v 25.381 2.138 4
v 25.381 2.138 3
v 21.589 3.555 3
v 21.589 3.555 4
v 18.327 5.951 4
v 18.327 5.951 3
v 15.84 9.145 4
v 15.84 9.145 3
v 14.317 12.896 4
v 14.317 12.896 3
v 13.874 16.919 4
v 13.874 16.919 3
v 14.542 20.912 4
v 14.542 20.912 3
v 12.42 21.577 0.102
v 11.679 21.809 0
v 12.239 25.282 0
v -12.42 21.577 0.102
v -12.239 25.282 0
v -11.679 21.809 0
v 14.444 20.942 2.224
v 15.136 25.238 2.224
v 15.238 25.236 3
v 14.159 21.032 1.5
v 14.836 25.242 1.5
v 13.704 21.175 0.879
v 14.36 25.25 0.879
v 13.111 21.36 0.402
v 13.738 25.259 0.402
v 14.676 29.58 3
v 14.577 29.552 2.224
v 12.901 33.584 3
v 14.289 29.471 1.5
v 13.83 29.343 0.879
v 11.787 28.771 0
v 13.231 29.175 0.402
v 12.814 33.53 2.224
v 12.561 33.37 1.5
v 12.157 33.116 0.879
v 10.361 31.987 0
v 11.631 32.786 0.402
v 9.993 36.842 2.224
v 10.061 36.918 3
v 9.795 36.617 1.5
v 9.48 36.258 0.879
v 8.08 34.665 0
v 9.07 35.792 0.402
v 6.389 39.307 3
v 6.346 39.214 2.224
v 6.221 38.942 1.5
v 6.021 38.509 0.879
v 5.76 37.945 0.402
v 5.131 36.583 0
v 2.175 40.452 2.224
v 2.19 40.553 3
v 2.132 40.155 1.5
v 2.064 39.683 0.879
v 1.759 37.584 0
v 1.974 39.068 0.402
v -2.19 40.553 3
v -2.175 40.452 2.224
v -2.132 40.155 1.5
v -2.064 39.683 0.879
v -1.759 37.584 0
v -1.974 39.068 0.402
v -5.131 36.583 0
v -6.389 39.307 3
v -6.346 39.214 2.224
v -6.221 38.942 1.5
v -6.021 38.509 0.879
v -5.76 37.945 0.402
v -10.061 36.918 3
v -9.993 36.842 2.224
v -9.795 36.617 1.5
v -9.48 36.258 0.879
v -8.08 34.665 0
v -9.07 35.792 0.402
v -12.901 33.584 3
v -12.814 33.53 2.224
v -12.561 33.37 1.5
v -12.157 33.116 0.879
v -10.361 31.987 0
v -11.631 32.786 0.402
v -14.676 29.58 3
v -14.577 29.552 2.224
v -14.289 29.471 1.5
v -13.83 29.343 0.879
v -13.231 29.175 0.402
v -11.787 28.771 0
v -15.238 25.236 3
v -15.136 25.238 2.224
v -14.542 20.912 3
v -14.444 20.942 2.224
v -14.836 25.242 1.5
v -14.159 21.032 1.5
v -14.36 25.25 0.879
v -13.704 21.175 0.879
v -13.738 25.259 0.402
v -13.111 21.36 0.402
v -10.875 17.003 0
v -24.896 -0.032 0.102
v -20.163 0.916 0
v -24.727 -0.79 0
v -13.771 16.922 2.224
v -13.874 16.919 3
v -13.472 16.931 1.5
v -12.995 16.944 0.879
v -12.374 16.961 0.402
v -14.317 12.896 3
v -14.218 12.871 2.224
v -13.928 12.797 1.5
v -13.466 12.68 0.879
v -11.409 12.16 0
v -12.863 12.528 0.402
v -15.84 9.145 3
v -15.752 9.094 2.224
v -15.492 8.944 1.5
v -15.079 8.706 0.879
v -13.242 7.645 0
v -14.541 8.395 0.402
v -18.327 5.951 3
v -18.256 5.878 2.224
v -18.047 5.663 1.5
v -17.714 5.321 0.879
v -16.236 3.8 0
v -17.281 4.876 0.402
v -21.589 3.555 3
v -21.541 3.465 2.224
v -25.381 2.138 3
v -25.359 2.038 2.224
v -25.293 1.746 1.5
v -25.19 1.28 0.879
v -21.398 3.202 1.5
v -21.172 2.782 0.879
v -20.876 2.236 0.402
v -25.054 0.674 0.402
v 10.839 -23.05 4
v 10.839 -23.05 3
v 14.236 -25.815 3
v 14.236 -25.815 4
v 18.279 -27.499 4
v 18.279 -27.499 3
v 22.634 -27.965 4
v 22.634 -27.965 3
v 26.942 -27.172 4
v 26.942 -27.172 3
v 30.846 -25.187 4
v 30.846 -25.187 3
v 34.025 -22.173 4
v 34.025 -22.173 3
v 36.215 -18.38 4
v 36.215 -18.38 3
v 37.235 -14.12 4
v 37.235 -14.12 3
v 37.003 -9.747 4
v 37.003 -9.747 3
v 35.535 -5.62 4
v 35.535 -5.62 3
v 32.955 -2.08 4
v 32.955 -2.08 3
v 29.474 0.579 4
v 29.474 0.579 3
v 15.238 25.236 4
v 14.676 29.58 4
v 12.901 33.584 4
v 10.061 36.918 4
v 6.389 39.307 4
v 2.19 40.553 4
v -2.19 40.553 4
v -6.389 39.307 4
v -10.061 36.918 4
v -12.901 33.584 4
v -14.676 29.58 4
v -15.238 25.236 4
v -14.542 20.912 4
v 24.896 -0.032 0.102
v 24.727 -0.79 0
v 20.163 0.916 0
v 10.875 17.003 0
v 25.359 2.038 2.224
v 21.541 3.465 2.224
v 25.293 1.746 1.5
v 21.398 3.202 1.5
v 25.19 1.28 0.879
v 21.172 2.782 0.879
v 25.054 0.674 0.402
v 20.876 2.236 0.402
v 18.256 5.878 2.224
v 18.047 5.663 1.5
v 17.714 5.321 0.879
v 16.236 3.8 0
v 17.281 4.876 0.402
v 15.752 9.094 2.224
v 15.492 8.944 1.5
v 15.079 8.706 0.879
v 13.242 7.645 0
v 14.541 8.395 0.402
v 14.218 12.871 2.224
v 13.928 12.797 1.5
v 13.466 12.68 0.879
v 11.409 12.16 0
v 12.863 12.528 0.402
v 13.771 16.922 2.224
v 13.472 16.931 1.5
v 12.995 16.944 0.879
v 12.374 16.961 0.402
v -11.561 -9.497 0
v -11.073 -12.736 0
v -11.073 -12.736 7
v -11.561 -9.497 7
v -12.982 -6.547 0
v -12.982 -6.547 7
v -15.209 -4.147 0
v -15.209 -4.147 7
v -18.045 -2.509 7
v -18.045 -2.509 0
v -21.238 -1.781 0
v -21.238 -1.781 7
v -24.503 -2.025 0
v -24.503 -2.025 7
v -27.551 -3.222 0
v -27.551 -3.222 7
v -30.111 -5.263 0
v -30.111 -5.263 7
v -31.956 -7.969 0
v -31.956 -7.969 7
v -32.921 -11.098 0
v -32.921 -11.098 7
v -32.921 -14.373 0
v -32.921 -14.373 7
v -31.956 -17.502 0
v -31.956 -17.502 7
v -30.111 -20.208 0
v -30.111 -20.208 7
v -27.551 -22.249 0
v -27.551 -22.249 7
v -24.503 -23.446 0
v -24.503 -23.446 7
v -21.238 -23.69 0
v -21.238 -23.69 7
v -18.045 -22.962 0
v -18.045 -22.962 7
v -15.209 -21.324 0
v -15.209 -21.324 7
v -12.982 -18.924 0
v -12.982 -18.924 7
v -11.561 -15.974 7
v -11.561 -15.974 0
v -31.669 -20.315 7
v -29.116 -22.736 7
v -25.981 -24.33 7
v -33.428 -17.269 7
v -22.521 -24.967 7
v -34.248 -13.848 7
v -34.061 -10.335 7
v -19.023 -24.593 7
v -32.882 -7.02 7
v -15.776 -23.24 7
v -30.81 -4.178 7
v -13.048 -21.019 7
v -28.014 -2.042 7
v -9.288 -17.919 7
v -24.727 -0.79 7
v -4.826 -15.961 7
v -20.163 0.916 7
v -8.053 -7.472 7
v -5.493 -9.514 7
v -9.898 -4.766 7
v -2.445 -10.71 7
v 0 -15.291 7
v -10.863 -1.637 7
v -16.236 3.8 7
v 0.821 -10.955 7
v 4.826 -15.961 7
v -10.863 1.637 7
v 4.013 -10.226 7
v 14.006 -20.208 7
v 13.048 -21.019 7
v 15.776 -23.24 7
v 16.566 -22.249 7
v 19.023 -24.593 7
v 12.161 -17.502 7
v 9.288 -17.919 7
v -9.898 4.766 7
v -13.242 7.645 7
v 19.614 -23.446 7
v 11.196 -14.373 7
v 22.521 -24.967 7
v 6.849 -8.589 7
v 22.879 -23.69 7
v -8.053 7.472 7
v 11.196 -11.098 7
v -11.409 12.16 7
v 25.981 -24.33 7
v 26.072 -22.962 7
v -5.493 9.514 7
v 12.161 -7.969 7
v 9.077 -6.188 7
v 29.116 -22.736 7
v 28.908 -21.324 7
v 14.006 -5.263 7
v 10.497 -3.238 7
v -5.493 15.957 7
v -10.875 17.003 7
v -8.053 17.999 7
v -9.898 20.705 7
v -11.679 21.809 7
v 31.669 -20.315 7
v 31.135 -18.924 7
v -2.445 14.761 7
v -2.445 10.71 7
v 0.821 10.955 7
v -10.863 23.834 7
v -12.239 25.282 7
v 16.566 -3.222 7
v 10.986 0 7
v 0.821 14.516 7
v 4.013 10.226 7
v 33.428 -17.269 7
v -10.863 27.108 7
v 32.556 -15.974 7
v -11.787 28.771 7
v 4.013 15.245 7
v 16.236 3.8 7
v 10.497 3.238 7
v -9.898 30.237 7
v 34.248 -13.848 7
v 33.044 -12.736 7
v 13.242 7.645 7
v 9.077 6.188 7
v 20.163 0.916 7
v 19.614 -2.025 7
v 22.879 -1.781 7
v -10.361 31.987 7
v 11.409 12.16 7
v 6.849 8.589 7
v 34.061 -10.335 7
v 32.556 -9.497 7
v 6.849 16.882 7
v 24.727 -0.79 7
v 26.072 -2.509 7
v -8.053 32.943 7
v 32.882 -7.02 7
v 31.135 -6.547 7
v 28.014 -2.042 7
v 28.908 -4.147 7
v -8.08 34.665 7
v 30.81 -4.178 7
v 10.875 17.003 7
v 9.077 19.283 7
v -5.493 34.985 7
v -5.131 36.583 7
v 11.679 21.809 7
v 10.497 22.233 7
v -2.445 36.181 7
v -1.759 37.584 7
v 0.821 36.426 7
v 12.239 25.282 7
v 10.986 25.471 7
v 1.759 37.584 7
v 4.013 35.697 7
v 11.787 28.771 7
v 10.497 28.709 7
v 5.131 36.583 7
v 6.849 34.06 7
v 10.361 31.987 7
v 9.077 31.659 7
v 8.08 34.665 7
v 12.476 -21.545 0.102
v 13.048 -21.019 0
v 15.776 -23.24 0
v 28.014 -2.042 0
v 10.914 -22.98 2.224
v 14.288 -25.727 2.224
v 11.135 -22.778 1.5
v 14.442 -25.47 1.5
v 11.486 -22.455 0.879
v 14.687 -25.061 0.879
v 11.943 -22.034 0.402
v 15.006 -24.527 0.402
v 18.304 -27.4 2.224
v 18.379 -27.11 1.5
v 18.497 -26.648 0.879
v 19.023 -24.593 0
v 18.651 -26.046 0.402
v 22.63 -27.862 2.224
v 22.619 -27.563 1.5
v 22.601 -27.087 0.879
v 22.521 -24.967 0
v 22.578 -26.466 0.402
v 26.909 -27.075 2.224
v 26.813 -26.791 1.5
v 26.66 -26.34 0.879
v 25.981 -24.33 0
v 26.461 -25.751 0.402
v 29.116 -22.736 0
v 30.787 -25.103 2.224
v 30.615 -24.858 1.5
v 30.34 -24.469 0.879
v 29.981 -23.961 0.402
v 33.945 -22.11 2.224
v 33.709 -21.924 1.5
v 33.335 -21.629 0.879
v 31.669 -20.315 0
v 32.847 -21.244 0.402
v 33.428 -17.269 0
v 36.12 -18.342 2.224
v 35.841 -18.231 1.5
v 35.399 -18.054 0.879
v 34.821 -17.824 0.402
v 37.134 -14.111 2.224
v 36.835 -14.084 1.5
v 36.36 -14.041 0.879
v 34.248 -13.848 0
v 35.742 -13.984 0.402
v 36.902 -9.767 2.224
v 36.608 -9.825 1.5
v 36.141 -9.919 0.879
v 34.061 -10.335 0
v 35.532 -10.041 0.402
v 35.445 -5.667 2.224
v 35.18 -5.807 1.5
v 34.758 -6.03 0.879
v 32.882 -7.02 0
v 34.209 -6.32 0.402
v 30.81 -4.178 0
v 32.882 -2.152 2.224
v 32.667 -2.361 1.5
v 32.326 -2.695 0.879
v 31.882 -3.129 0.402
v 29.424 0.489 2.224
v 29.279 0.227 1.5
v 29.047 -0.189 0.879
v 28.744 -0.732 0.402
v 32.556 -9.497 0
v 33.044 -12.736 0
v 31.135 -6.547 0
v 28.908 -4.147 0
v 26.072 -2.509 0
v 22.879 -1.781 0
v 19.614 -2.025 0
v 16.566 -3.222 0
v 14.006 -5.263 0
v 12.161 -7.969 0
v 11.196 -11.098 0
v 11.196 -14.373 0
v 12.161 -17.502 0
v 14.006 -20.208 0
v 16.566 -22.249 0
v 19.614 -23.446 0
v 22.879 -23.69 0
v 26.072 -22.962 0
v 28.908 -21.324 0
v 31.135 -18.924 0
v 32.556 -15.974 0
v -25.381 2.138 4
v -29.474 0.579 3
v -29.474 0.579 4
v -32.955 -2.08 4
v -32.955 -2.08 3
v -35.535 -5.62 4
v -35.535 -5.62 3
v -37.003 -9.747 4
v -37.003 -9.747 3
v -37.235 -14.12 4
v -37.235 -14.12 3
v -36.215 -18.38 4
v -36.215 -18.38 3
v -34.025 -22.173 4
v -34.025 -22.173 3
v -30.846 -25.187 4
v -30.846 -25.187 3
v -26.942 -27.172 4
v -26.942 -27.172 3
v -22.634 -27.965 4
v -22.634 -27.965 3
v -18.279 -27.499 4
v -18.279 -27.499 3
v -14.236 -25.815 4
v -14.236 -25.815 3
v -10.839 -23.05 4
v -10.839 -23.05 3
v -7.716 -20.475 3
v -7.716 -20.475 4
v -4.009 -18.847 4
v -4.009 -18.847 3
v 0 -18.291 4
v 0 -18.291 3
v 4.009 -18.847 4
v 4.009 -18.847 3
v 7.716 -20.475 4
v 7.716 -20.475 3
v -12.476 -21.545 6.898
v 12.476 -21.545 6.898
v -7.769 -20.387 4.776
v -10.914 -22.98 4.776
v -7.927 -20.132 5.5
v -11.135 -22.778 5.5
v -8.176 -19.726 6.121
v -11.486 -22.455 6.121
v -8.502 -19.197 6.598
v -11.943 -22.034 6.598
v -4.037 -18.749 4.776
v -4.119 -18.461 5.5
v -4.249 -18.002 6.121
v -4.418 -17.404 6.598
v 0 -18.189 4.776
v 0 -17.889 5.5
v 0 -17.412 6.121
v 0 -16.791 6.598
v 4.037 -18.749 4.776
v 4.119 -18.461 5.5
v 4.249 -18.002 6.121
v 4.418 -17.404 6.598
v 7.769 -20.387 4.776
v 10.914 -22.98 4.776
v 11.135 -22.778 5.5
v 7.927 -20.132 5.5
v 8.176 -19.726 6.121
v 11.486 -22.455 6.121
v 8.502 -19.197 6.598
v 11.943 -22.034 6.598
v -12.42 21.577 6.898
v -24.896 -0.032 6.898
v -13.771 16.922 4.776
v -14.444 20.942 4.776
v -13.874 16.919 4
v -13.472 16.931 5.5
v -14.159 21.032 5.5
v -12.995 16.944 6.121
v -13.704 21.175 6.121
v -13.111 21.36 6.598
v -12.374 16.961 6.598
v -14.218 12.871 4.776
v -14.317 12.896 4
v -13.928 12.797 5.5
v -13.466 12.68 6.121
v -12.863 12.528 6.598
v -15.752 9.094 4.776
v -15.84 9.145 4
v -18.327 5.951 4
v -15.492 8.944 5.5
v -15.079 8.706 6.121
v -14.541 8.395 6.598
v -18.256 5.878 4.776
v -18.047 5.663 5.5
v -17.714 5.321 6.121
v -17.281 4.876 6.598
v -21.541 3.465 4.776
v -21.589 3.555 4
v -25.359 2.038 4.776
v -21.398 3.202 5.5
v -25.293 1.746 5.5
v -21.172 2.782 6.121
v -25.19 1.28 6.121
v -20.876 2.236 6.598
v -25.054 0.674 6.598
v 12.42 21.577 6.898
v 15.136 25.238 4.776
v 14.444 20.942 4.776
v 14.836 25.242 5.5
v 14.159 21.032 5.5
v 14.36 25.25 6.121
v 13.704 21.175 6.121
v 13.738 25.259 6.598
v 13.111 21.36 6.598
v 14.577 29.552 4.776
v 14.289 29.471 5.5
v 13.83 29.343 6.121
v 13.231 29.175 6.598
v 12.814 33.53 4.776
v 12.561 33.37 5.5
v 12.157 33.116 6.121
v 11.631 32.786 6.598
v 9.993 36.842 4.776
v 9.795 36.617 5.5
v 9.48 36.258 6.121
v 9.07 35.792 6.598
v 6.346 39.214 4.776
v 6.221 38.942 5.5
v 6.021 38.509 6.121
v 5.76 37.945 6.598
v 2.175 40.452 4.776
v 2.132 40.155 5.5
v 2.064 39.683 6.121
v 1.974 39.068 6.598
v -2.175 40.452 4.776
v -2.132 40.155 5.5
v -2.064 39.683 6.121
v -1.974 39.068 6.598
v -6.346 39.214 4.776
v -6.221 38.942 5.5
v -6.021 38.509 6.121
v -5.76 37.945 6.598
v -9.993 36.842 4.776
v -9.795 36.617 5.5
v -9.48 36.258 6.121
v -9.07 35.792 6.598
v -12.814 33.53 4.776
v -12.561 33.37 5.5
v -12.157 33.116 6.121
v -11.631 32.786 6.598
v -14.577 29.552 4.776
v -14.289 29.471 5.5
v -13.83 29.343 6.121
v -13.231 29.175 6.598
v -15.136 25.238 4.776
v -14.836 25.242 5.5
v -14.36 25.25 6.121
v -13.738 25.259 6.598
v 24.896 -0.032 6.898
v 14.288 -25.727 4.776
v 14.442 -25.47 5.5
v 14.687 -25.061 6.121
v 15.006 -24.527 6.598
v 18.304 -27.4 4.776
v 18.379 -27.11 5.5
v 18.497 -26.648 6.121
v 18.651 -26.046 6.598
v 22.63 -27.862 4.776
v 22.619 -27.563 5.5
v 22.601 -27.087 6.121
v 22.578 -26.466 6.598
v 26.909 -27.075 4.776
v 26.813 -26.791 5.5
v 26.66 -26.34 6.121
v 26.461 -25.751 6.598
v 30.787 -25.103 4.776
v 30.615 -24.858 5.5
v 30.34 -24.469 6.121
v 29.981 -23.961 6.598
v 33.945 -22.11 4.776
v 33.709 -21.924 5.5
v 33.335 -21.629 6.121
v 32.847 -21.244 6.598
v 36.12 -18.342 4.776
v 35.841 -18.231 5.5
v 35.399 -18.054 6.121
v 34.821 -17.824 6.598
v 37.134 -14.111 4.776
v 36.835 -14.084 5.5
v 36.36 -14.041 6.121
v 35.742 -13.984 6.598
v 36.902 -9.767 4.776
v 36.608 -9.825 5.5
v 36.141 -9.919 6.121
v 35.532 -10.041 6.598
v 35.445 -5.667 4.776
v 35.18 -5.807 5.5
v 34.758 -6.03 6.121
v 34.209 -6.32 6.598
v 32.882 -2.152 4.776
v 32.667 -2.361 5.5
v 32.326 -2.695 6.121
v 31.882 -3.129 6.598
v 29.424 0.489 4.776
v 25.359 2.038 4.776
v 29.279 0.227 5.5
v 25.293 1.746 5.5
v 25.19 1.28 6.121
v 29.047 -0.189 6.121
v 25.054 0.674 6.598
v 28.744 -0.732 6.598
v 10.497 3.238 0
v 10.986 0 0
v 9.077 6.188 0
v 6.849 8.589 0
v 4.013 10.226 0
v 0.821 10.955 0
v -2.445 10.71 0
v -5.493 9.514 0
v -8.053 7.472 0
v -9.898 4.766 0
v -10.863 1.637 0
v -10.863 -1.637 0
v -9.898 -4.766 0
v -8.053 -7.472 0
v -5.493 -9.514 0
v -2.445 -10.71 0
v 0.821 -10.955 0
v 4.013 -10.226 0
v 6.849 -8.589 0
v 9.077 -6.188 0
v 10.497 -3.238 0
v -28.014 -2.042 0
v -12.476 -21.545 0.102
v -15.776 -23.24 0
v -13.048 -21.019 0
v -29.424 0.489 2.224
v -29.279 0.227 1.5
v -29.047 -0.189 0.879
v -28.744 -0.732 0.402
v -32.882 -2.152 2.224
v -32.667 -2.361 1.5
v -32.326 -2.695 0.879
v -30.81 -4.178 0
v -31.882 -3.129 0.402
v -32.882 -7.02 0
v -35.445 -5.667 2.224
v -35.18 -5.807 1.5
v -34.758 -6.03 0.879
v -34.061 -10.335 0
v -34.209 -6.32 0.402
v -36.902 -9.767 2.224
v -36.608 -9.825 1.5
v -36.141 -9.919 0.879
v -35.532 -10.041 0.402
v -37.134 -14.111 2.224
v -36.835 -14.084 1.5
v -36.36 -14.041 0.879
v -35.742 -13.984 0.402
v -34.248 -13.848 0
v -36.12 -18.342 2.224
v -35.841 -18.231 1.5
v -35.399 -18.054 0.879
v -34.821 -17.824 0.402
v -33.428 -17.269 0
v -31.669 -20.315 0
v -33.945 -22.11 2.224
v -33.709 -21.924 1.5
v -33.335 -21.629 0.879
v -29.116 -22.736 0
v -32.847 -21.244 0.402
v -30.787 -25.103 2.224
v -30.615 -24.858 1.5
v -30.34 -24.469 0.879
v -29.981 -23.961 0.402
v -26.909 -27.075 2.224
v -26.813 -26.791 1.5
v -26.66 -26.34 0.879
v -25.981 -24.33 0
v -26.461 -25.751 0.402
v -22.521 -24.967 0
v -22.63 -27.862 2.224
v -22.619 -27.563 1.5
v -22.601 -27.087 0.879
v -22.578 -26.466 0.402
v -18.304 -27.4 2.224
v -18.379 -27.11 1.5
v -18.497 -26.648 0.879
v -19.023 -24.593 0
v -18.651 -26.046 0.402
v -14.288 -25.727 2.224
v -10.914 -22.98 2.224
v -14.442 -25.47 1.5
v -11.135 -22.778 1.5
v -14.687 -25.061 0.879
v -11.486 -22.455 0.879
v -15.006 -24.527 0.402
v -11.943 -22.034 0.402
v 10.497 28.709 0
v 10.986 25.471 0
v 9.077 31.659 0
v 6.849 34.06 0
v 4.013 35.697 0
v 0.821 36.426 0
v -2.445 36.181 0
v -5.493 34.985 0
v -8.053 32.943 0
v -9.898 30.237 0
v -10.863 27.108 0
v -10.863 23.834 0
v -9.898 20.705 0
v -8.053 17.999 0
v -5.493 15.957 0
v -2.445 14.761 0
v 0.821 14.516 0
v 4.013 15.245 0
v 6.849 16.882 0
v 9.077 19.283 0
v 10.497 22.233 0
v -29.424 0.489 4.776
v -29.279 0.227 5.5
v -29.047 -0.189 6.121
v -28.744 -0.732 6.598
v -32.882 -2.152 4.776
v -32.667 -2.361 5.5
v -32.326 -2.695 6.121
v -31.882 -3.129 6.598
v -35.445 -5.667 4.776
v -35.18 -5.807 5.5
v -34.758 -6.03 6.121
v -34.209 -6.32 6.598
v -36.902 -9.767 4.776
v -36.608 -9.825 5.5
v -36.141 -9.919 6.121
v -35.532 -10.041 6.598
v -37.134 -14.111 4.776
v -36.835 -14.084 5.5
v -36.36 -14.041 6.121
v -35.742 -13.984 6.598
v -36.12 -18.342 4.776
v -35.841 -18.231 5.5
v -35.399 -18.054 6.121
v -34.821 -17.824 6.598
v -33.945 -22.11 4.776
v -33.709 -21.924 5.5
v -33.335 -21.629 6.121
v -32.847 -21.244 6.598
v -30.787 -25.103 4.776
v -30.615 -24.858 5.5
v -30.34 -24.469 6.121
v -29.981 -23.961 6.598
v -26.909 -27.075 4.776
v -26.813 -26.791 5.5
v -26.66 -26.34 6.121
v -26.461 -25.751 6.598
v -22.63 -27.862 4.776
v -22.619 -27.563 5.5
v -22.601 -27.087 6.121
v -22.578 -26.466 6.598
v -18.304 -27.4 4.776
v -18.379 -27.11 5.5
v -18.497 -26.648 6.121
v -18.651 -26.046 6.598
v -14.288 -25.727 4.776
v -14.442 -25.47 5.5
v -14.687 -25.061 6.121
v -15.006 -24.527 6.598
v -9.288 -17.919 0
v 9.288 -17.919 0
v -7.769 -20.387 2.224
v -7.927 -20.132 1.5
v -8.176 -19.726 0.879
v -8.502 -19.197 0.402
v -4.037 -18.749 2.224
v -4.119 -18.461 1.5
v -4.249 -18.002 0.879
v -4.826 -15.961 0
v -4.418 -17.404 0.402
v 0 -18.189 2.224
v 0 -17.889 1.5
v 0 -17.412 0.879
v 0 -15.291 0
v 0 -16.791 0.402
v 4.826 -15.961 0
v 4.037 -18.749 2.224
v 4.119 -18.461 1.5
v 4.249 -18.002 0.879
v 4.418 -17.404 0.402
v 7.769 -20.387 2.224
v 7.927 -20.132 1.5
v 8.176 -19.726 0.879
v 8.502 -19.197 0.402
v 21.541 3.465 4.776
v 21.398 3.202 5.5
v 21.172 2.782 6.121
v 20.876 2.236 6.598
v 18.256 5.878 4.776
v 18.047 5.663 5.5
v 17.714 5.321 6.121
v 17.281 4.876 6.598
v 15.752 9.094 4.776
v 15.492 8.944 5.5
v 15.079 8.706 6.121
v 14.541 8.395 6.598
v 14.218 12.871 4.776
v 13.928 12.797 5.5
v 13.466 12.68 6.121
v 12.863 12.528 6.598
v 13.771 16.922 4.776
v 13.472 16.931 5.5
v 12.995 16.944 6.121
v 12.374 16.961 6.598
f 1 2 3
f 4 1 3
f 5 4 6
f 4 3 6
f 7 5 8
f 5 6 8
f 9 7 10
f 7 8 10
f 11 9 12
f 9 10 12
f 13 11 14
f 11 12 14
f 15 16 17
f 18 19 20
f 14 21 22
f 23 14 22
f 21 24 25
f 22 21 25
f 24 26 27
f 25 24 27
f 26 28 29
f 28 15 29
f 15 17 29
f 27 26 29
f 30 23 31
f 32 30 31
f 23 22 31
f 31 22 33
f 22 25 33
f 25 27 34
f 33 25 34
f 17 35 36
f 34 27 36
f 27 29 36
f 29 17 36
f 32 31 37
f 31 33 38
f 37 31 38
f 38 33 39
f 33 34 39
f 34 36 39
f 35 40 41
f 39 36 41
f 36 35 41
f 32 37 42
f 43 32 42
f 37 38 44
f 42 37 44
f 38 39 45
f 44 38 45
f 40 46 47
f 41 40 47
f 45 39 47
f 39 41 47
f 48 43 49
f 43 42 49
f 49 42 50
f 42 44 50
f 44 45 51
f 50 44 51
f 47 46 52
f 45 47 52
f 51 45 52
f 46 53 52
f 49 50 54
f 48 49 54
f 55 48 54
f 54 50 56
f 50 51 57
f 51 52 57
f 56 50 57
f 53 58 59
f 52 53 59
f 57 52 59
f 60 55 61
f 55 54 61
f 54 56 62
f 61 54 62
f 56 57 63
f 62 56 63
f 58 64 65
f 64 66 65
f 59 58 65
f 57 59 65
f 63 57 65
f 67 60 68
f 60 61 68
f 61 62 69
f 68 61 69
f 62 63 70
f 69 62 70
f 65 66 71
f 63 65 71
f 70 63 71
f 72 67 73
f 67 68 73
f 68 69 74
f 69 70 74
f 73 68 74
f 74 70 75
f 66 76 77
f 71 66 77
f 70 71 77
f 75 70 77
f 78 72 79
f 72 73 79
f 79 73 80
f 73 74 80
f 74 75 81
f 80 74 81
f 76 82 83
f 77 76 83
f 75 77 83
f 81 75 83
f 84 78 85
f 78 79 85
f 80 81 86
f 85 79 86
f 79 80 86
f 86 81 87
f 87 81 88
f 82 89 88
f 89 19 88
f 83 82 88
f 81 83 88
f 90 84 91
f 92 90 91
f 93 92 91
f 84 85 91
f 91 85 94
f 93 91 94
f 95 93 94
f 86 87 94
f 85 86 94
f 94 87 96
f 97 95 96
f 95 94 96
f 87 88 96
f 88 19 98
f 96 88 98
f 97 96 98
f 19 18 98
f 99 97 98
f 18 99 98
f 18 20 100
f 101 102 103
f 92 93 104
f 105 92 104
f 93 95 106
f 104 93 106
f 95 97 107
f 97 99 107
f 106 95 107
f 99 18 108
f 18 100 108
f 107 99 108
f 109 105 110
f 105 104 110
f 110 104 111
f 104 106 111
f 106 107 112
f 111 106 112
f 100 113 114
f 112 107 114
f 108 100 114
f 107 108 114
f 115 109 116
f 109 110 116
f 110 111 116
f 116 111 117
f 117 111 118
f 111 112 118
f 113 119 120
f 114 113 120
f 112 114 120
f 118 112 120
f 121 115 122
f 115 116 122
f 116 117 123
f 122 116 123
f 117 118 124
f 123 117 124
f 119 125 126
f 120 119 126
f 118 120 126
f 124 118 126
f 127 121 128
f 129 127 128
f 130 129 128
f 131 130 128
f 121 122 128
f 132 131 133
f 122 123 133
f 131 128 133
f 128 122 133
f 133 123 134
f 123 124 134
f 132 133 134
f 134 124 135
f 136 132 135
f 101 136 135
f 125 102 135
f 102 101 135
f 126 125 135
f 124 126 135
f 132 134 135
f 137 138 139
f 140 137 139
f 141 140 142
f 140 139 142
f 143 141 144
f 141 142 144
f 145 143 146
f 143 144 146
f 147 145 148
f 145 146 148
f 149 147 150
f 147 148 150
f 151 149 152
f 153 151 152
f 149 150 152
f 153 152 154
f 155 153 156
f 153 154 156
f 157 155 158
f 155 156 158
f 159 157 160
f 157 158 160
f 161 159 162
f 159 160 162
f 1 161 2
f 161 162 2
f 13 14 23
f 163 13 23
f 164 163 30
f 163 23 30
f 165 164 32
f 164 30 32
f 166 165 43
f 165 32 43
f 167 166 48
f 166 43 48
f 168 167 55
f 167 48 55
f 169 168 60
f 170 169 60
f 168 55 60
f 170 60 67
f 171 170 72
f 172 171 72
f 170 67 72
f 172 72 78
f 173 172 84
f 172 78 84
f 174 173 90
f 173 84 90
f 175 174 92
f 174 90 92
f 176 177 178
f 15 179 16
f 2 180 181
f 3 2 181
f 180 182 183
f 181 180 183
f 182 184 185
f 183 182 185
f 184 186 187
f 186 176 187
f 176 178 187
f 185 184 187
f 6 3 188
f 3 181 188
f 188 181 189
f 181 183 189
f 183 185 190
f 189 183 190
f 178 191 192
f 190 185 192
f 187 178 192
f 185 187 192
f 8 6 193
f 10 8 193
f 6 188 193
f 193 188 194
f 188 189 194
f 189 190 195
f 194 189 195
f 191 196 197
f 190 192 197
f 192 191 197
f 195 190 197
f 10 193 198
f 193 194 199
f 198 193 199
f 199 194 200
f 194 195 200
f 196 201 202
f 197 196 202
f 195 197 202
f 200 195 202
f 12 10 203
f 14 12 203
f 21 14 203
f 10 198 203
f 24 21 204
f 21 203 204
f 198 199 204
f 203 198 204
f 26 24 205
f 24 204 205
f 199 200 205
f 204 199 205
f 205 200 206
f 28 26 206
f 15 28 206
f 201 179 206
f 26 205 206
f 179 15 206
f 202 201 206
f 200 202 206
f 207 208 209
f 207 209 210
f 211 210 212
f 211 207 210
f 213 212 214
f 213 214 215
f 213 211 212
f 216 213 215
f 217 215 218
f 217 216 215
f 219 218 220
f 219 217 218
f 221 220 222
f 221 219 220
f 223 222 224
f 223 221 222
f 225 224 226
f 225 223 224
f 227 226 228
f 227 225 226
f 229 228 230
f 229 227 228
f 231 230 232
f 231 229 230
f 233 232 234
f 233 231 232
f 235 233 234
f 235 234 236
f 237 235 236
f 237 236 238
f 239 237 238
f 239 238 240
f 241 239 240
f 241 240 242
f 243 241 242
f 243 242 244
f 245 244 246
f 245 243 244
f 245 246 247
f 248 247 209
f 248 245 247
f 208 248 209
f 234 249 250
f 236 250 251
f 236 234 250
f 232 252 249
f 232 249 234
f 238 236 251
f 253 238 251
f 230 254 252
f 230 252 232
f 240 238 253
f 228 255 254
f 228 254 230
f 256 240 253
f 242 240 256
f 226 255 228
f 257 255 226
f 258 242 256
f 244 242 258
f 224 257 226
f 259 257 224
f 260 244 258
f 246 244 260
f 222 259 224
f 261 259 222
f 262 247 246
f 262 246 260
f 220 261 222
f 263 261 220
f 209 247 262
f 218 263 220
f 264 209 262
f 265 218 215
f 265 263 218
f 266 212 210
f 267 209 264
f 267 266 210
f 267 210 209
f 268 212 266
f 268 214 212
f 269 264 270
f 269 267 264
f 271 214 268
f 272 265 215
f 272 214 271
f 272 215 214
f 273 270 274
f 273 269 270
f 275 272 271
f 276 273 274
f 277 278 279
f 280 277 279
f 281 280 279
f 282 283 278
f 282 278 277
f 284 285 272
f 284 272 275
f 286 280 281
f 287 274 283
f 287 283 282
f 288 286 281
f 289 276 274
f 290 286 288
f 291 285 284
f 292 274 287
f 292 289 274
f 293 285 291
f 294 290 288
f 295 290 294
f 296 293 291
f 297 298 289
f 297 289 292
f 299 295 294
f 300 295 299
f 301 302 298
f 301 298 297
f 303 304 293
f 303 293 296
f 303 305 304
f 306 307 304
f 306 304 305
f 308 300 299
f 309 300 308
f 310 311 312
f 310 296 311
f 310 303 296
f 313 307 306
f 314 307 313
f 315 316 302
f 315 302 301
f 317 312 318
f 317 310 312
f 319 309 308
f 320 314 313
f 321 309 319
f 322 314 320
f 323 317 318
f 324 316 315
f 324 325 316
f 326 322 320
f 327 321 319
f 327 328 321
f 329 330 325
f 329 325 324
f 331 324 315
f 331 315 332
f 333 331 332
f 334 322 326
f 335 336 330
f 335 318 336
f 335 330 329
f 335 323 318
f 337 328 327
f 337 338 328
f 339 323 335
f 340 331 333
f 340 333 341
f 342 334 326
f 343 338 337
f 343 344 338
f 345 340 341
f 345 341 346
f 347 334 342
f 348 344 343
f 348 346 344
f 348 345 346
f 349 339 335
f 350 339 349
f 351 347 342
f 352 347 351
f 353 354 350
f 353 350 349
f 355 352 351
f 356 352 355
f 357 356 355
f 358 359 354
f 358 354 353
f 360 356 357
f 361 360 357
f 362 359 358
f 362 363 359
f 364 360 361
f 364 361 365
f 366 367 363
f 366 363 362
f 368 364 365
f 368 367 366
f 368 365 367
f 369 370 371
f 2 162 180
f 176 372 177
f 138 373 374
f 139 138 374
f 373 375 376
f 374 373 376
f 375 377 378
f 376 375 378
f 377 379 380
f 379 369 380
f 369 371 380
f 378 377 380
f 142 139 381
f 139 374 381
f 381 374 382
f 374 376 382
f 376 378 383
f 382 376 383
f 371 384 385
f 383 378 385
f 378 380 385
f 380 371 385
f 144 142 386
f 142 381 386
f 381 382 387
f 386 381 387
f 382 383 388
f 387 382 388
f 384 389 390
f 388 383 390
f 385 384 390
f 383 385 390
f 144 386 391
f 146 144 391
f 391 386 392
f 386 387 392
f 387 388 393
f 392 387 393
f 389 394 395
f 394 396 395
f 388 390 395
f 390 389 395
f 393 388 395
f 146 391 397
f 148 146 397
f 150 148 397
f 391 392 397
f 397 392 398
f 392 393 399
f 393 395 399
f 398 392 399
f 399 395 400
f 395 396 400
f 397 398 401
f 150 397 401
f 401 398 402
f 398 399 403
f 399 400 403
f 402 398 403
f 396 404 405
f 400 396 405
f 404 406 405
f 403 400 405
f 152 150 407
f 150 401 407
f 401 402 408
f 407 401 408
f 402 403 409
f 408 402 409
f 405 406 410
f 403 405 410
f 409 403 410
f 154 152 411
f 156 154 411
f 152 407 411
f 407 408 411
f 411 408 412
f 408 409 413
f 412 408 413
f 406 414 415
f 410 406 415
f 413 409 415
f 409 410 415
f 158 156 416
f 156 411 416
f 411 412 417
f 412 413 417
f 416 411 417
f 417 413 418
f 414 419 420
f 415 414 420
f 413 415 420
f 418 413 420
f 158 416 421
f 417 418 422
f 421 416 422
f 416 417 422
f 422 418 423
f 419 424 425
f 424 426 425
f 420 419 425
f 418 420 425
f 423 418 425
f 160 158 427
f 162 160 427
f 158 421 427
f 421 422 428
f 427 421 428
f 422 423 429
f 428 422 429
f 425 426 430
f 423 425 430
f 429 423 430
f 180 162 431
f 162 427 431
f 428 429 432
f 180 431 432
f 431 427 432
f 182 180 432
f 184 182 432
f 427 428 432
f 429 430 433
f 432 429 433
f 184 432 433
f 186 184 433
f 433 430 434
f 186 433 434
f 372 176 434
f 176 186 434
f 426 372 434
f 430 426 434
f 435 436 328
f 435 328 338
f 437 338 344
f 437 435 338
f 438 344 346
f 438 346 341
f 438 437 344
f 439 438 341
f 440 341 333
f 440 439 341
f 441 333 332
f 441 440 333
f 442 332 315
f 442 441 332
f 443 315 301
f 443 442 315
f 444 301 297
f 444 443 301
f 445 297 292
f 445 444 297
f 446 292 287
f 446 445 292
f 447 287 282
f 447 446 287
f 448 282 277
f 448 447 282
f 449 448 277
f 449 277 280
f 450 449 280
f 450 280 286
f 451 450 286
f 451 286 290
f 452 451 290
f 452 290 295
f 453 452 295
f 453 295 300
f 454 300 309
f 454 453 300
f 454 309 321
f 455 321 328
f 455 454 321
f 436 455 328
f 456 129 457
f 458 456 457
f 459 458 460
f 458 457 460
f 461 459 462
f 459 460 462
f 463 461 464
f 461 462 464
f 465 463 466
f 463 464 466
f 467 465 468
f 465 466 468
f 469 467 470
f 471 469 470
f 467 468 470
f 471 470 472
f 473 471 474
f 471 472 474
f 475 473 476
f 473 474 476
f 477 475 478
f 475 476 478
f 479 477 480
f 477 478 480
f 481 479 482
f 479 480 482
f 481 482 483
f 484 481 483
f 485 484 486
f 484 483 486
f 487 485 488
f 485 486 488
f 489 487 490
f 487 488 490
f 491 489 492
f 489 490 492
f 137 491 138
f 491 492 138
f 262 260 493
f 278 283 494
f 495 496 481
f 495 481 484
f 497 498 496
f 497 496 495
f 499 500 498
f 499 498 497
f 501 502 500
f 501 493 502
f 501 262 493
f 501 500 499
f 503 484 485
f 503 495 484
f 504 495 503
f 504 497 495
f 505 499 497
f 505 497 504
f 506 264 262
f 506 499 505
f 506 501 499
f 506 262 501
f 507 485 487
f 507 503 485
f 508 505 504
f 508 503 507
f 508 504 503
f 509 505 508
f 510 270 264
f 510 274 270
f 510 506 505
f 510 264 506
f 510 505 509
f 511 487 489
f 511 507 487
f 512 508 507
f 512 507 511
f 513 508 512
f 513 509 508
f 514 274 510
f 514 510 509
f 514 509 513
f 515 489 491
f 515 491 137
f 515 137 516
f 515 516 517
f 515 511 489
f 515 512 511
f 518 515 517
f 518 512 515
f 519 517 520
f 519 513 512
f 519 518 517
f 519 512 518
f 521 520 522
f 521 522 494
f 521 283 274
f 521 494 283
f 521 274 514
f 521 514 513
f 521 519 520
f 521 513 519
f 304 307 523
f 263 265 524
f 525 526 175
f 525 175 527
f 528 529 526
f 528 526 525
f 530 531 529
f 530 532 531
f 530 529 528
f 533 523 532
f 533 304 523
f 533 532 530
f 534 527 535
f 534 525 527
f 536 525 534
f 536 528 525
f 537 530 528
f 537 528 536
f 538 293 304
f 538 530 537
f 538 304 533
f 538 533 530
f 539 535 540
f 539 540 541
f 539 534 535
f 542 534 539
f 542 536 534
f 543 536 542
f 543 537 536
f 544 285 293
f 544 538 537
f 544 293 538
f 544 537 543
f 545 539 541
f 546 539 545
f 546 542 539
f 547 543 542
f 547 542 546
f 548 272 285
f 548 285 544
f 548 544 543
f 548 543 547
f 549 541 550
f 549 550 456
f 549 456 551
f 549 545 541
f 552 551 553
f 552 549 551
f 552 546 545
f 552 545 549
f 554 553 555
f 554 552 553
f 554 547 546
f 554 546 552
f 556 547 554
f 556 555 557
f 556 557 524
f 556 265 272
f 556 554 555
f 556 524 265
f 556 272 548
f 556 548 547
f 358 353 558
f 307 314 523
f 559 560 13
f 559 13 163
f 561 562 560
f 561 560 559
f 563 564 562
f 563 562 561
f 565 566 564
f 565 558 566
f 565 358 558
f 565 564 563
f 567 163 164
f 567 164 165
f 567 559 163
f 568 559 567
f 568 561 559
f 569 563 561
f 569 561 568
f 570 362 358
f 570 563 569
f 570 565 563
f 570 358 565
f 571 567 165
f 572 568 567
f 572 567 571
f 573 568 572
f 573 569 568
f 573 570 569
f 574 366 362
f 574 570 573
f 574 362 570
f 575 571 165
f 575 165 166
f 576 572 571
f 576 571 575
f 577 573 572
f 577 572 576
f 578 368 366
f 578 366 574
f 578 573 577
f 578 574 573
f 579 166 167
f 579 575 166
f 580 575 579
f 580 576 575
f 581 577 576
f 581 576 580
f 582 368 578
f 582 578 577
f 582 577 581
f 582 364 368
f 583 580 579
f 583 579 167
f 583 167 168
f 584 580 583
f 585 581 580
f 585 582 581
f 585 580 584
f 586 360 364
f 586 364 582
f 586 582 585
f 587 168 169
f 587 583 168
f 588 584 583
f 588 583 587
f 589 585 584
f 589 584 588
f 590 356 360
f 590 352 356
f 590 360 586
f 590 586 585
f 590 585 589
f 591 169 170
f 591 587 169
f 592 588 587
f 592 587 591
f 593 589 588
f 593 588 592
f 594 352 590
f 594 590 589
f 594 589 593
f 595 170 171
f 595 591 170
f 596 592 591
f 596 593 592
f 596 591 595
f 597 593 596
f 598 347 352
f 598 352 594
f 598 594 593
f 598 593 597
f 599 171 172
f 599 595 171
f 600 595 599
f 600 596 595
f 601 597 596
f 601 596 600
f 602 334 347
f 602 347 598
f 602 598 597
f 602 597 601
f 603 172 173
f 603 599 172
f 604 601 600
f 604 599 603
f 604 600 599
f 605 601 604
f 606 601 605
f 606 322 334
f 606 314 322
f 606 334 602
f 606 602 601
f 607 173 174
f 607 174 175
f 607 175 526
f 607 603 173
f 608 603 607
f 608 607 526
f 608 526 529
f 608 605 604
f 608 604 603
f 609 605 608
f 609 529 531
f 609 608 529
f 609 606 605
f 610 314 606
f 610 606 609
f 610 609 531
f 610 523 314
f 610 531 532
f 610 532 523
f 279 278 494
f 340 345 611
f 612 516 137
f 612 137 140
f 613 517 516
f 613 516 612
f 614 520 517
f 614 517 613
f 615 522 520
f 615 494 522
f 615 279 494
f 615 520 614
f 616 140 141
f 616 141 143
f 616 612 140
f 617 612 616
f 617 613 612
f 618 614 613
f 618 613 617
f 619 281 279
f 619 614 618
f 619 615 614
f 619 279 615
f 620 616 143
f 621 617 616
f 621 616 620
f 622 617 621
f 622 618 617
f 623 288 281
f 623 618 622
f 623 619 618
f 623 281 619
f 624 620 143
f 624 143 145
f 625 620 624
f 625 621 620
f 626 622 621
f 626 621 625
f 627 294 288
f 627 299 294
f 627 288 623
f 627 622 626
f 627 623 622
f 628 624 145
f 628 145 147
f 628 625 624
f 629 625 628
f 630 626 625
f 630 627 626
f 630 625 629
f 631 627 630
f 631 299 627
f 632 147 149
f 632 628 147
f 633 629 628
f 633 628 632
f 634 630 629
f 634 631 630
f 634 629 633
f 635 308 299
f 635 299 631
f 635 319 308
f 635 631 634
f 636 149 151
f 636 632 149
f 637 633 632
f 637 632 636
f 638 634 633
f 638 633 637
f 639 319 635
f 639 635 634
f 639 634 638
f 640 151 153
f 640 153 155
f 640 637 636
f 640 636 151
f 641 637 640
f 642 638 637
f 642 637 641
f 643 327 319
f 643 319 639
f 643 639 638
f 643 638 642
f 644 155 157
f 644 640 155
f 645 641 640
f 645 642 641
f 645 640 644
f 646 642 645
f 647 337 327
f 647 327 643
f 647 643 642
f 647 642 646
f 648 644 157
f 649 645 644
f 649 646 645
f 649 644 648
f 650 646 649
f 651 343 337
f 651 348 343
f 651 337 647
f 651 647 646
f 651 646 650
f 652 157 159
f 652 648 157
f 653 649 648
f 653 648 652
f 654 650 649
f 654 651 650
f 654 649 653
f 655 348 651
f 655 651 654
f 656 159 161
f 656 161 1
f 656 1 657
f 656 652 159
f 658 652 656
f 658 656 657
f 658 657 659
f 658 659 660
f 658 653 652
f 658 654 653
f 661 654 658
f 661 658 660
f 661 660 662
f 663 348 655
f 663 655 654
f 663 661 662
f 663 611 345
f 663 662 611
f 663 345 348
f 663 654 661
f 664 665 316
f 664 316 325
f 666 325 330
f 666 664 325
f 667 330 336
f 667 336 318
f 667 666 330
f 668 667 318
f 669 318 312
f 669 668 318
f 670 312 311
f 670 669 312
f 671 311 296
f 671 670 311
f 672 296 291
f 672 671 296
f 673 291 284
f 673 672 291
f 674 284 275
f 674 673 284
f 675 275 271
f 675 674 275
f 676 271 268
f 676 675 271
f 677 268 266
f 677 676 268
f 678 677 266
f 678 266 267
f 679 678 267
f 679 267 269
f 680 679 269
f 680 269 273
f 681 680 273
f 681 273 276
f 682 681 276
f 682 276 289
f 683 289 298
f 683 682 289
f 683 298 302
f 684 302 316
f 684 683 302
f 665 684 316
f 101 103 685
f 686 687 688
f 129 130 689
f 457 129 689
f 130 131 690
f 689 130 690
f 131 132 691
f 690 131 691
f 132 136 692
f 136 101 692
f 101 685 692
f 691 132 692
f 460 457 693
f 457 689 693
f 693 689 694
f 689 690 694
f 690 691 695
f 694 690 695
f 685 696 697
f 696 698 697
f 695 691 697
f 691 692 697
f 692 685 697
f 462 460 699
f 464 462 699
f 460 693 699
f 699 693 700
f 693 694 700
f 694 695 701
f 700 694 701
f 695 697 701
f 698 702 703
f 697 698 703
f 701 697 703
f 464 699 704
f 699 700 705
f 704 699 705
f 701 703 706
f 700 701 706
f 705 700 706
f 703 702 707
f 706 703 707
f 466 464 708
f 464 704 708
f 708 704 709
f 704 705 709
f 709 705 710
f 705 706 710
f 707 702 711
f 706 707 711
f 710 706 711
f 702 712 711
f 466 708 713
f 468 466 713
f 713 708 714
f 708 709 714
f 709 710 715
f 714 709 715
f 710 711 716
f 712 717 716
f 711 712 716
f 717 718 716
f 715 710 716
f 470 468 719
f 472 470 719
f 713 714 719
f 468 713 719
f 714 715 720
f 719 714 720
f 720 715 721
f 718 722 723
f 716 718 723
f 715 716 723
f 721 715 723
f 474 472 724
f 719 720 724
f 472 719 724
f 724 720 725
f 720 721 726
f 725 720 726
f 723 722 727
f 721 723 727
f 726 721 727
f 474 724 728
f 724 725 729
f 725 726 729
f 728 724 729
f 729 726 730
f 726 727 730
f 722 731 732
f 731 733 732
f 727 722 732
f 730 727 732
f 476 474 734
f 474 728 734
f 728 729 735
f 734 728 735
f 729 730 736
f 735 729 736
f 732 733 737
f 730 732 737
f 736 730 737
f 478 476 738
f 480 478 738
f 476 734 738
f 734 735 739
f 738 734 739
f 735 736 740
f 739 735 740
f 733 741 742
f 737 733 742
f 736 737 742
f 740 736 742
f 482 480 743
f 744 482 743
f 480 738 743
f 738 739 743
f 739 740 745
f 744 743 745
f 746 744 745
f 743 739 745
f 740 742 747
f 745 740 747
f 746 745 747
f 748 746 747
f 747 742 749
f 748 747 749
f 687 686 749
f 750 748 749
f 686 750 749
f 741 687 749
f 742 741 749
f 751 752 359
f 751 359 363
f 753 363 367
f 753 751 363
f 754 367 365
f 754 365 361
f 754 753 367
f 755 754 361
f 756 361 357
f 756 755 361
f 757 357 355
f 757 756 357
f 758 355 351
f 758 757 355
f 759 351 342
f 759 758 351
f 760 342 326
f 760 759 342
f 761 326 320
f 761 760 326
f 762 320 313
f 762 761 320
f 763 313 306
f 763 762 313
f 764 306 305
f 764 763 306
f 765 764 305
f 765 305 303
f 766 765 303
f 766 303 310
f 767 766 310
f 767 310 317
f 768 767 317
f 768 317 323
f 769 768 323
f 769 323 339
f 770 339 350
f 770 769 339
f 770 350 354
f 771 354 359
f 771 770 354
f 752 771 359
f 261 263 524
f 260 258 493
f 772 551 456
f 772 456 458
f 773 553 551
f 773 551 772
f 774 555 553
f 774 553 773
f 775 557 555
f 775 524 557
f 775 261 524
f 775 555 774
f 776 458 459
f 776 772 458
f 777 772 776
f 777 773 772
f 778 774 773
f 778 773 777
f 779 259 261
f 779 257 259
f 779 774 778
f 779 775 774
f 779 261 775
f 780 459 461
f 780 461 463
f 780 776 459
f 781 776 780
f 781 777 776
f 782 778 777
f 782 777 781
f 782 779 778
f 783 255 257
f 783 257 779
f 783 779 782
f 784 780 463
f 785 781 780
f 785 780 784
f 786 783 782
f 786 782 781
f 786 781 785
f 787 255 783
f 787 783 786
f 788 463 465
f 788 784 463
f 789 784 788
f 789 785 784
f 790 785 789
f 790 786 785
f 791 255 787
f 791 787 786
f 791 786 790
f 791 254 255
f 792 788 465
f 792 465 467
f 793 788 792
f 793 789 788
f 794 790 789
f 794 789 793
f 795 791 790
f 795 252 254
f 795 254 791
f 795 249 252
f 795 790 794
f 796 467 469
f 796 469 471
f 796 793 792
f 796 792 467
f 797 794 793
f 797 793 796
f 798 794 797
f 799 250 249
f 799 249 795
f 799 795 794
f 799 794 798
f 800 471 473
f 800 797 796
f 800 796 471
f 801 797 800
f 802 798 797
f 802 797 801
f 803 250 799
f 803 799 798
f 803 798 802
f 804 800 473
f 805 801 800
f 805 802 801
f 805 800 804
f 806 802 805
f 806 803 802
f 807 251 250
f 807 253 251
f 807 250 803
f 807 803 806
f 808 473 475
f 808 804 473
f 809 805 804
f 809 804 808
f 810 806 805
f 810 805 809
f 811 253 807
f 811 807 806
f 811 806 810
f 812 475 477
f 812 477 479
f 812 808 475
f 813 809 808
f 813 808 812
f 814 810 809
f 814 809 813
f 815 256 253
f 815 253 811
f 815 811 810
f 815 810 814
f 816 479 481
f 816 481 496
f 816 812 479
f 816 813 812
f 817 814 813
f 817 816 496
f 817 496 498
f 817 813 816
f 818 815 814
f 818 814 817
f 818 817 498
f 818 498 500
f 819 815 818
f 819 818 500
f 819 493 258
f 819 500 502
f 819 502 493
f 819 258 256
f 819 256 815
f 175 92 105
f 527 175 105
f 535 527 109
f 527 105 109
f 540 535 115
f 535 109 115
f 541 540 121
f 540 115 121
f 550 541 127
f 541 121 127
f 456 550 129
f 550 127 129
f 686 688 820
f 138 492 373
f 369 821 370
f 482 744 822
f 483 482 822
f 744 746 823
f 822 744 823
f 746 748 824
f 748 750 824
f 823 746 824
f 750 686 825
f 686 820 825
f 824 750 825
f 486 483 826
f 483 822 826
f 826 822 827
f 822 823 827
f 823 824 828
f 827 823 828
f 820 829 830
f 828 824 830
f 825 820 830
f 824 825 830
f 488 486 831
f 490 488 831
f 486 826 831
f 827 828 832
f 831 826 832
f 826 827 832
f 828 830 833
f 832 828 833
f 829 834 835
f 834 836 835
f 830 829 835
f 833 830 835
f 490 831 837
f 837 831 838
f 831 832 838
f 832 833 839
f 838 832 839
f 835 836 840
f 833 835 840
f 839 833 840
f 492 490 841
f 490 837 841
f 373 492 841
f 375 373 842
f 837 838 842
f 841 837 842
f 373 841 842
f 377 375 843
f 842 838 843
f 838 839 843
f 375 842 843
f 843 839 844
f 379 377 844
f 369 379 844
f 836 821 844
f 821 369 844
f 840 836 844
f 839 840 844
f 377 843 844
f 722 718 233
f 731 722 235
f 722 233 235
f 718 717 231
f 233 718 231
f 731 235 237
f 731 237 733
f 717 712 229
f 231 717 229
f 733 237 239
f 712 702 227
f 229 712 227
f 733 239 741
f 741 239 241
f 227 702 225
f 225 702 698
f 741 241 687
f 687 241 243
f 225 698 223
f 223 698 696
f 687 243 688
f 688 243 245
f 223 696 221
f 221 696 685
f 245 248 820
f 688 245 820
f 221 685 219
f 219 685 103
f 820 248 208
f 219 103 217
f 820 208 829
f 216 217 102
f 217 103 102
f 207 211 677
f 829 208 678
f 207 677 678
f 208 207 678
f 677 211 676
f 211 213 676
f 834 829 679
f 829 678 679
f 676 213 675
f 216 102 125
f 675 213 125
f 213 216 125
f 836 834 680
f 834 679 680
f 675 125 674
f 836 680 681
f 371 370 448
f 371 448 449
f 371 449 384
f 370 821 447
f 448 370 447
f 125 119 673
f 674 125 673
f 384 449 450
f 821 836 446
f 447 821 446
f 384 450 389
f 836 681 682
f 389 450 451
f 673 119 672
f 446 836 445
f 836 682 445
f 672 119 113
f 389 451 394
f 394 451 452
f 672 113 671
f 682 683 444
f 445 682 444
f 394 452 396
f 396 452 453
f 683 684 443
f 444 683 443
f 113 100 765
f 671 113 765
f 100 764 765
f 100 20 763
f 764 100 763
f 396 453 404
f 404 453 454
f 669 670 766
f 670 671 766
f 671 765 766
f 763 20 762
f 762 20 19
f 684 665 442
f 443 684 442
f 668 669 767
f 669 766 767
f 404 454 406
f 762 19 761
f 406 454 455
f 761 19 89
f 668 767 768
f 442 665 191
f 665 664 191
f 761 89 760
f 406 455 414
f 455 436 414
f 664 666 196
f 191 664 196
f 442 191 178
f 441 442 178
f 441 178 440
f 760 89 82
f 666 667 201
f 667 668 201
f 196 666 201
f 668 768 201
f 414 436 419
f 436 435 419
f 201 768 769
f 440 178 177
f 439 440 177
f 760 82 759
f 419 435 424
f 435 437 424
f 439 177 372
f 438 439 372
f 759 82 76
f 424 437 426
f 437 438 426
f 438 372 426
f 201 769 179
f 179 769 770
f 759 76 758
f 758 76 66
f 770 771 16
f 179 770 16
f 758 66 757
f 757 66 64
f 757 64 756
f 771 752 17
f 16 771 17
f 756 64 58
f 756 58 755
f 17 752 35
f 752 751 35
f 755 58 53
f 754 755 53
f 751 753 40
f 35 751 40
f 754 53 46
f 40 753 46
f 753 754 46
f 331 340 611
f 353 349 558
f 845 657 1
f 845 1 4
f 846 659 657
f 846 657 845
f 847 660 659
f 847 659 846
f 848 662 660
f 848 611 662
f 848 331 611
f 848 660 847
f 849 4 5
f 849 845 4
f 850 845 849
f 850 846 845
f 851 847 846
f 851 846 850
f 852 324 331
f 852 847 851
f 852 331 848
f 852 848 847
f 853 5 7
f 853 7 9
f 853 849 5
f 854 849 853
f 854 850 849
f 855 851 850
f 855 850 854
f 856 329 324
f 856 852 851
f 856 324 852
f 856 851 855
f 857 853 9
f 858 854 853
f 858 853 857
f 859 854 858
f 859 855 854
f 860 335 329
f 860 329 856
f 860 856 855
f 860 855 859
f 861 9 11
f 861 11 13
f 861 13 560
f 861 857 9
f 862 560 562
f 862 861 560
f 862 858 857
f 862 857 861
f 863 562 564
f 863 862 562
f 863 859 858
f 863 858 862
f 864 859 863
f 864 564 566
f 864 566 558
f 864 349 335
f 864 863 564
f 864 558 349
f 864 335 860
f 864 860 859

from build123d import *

# Parameters (mm, degrees)
F0_R     = 10.9855
F1_DEPTH = 7
F2_R     = 3


with BuildPart() as f1:
    # F0 (on Top) → F1 (new body)
    with BuildSketch(Plane.XY):
        with BuildLine():
            ThreePointArc((25.381119, 2.1379), (15.840285, 9.145393), (14.542035, 20.911744))
            ThreePointArc((14.542035, 20.911744), (0, 40.711), (-14.542035, 20.911744))
            ThreePointArc((-14.542035, 20.911744), (-15.840285, 9.145393), (-25.381119, 2.1379))
            ThreePointArc((-25.381119, 2.1379), (-35.25676, -20.3555), (-10.839084, -23.049644))
            ThreePointArc((-10.839084, -23.049644), (0, -18.290786), (10.839084, -23.049644))
            ThreePointArc((10.839084, -23.049644), (35.25676, -20.3555), (25.381119, 2.1379))
        make_face()
        with Locations((-22.058533, -12.7355)):
            Circle(F0_R, mode=Mode.SUBTRACT)
        with Locations((22.058533, -12.7355)):
            Circle(F0_R, mode=Mode.SUBTRACT)
        Circle(F0_R, mode=Mode.SUBTRACT)
        with Locations((0, 25.471)):
            Circle(F0_R, mode=Mode.SUBTRACT)
    extrude(amount=F1_DEPTH)

    # F2
    f2_edges = [f1.edges().sort_by_distance(p)[0] for p in [
        (25.381119, 2.1379, 3.5),
        (14.542035, 20.911744, 3.5),
        (15.840285, 9.145393, 0),
        (15.840285, 9.145393, 7),
    ]]
    fillet(f2_edges, radius=F2_R)


solid = f1.part
